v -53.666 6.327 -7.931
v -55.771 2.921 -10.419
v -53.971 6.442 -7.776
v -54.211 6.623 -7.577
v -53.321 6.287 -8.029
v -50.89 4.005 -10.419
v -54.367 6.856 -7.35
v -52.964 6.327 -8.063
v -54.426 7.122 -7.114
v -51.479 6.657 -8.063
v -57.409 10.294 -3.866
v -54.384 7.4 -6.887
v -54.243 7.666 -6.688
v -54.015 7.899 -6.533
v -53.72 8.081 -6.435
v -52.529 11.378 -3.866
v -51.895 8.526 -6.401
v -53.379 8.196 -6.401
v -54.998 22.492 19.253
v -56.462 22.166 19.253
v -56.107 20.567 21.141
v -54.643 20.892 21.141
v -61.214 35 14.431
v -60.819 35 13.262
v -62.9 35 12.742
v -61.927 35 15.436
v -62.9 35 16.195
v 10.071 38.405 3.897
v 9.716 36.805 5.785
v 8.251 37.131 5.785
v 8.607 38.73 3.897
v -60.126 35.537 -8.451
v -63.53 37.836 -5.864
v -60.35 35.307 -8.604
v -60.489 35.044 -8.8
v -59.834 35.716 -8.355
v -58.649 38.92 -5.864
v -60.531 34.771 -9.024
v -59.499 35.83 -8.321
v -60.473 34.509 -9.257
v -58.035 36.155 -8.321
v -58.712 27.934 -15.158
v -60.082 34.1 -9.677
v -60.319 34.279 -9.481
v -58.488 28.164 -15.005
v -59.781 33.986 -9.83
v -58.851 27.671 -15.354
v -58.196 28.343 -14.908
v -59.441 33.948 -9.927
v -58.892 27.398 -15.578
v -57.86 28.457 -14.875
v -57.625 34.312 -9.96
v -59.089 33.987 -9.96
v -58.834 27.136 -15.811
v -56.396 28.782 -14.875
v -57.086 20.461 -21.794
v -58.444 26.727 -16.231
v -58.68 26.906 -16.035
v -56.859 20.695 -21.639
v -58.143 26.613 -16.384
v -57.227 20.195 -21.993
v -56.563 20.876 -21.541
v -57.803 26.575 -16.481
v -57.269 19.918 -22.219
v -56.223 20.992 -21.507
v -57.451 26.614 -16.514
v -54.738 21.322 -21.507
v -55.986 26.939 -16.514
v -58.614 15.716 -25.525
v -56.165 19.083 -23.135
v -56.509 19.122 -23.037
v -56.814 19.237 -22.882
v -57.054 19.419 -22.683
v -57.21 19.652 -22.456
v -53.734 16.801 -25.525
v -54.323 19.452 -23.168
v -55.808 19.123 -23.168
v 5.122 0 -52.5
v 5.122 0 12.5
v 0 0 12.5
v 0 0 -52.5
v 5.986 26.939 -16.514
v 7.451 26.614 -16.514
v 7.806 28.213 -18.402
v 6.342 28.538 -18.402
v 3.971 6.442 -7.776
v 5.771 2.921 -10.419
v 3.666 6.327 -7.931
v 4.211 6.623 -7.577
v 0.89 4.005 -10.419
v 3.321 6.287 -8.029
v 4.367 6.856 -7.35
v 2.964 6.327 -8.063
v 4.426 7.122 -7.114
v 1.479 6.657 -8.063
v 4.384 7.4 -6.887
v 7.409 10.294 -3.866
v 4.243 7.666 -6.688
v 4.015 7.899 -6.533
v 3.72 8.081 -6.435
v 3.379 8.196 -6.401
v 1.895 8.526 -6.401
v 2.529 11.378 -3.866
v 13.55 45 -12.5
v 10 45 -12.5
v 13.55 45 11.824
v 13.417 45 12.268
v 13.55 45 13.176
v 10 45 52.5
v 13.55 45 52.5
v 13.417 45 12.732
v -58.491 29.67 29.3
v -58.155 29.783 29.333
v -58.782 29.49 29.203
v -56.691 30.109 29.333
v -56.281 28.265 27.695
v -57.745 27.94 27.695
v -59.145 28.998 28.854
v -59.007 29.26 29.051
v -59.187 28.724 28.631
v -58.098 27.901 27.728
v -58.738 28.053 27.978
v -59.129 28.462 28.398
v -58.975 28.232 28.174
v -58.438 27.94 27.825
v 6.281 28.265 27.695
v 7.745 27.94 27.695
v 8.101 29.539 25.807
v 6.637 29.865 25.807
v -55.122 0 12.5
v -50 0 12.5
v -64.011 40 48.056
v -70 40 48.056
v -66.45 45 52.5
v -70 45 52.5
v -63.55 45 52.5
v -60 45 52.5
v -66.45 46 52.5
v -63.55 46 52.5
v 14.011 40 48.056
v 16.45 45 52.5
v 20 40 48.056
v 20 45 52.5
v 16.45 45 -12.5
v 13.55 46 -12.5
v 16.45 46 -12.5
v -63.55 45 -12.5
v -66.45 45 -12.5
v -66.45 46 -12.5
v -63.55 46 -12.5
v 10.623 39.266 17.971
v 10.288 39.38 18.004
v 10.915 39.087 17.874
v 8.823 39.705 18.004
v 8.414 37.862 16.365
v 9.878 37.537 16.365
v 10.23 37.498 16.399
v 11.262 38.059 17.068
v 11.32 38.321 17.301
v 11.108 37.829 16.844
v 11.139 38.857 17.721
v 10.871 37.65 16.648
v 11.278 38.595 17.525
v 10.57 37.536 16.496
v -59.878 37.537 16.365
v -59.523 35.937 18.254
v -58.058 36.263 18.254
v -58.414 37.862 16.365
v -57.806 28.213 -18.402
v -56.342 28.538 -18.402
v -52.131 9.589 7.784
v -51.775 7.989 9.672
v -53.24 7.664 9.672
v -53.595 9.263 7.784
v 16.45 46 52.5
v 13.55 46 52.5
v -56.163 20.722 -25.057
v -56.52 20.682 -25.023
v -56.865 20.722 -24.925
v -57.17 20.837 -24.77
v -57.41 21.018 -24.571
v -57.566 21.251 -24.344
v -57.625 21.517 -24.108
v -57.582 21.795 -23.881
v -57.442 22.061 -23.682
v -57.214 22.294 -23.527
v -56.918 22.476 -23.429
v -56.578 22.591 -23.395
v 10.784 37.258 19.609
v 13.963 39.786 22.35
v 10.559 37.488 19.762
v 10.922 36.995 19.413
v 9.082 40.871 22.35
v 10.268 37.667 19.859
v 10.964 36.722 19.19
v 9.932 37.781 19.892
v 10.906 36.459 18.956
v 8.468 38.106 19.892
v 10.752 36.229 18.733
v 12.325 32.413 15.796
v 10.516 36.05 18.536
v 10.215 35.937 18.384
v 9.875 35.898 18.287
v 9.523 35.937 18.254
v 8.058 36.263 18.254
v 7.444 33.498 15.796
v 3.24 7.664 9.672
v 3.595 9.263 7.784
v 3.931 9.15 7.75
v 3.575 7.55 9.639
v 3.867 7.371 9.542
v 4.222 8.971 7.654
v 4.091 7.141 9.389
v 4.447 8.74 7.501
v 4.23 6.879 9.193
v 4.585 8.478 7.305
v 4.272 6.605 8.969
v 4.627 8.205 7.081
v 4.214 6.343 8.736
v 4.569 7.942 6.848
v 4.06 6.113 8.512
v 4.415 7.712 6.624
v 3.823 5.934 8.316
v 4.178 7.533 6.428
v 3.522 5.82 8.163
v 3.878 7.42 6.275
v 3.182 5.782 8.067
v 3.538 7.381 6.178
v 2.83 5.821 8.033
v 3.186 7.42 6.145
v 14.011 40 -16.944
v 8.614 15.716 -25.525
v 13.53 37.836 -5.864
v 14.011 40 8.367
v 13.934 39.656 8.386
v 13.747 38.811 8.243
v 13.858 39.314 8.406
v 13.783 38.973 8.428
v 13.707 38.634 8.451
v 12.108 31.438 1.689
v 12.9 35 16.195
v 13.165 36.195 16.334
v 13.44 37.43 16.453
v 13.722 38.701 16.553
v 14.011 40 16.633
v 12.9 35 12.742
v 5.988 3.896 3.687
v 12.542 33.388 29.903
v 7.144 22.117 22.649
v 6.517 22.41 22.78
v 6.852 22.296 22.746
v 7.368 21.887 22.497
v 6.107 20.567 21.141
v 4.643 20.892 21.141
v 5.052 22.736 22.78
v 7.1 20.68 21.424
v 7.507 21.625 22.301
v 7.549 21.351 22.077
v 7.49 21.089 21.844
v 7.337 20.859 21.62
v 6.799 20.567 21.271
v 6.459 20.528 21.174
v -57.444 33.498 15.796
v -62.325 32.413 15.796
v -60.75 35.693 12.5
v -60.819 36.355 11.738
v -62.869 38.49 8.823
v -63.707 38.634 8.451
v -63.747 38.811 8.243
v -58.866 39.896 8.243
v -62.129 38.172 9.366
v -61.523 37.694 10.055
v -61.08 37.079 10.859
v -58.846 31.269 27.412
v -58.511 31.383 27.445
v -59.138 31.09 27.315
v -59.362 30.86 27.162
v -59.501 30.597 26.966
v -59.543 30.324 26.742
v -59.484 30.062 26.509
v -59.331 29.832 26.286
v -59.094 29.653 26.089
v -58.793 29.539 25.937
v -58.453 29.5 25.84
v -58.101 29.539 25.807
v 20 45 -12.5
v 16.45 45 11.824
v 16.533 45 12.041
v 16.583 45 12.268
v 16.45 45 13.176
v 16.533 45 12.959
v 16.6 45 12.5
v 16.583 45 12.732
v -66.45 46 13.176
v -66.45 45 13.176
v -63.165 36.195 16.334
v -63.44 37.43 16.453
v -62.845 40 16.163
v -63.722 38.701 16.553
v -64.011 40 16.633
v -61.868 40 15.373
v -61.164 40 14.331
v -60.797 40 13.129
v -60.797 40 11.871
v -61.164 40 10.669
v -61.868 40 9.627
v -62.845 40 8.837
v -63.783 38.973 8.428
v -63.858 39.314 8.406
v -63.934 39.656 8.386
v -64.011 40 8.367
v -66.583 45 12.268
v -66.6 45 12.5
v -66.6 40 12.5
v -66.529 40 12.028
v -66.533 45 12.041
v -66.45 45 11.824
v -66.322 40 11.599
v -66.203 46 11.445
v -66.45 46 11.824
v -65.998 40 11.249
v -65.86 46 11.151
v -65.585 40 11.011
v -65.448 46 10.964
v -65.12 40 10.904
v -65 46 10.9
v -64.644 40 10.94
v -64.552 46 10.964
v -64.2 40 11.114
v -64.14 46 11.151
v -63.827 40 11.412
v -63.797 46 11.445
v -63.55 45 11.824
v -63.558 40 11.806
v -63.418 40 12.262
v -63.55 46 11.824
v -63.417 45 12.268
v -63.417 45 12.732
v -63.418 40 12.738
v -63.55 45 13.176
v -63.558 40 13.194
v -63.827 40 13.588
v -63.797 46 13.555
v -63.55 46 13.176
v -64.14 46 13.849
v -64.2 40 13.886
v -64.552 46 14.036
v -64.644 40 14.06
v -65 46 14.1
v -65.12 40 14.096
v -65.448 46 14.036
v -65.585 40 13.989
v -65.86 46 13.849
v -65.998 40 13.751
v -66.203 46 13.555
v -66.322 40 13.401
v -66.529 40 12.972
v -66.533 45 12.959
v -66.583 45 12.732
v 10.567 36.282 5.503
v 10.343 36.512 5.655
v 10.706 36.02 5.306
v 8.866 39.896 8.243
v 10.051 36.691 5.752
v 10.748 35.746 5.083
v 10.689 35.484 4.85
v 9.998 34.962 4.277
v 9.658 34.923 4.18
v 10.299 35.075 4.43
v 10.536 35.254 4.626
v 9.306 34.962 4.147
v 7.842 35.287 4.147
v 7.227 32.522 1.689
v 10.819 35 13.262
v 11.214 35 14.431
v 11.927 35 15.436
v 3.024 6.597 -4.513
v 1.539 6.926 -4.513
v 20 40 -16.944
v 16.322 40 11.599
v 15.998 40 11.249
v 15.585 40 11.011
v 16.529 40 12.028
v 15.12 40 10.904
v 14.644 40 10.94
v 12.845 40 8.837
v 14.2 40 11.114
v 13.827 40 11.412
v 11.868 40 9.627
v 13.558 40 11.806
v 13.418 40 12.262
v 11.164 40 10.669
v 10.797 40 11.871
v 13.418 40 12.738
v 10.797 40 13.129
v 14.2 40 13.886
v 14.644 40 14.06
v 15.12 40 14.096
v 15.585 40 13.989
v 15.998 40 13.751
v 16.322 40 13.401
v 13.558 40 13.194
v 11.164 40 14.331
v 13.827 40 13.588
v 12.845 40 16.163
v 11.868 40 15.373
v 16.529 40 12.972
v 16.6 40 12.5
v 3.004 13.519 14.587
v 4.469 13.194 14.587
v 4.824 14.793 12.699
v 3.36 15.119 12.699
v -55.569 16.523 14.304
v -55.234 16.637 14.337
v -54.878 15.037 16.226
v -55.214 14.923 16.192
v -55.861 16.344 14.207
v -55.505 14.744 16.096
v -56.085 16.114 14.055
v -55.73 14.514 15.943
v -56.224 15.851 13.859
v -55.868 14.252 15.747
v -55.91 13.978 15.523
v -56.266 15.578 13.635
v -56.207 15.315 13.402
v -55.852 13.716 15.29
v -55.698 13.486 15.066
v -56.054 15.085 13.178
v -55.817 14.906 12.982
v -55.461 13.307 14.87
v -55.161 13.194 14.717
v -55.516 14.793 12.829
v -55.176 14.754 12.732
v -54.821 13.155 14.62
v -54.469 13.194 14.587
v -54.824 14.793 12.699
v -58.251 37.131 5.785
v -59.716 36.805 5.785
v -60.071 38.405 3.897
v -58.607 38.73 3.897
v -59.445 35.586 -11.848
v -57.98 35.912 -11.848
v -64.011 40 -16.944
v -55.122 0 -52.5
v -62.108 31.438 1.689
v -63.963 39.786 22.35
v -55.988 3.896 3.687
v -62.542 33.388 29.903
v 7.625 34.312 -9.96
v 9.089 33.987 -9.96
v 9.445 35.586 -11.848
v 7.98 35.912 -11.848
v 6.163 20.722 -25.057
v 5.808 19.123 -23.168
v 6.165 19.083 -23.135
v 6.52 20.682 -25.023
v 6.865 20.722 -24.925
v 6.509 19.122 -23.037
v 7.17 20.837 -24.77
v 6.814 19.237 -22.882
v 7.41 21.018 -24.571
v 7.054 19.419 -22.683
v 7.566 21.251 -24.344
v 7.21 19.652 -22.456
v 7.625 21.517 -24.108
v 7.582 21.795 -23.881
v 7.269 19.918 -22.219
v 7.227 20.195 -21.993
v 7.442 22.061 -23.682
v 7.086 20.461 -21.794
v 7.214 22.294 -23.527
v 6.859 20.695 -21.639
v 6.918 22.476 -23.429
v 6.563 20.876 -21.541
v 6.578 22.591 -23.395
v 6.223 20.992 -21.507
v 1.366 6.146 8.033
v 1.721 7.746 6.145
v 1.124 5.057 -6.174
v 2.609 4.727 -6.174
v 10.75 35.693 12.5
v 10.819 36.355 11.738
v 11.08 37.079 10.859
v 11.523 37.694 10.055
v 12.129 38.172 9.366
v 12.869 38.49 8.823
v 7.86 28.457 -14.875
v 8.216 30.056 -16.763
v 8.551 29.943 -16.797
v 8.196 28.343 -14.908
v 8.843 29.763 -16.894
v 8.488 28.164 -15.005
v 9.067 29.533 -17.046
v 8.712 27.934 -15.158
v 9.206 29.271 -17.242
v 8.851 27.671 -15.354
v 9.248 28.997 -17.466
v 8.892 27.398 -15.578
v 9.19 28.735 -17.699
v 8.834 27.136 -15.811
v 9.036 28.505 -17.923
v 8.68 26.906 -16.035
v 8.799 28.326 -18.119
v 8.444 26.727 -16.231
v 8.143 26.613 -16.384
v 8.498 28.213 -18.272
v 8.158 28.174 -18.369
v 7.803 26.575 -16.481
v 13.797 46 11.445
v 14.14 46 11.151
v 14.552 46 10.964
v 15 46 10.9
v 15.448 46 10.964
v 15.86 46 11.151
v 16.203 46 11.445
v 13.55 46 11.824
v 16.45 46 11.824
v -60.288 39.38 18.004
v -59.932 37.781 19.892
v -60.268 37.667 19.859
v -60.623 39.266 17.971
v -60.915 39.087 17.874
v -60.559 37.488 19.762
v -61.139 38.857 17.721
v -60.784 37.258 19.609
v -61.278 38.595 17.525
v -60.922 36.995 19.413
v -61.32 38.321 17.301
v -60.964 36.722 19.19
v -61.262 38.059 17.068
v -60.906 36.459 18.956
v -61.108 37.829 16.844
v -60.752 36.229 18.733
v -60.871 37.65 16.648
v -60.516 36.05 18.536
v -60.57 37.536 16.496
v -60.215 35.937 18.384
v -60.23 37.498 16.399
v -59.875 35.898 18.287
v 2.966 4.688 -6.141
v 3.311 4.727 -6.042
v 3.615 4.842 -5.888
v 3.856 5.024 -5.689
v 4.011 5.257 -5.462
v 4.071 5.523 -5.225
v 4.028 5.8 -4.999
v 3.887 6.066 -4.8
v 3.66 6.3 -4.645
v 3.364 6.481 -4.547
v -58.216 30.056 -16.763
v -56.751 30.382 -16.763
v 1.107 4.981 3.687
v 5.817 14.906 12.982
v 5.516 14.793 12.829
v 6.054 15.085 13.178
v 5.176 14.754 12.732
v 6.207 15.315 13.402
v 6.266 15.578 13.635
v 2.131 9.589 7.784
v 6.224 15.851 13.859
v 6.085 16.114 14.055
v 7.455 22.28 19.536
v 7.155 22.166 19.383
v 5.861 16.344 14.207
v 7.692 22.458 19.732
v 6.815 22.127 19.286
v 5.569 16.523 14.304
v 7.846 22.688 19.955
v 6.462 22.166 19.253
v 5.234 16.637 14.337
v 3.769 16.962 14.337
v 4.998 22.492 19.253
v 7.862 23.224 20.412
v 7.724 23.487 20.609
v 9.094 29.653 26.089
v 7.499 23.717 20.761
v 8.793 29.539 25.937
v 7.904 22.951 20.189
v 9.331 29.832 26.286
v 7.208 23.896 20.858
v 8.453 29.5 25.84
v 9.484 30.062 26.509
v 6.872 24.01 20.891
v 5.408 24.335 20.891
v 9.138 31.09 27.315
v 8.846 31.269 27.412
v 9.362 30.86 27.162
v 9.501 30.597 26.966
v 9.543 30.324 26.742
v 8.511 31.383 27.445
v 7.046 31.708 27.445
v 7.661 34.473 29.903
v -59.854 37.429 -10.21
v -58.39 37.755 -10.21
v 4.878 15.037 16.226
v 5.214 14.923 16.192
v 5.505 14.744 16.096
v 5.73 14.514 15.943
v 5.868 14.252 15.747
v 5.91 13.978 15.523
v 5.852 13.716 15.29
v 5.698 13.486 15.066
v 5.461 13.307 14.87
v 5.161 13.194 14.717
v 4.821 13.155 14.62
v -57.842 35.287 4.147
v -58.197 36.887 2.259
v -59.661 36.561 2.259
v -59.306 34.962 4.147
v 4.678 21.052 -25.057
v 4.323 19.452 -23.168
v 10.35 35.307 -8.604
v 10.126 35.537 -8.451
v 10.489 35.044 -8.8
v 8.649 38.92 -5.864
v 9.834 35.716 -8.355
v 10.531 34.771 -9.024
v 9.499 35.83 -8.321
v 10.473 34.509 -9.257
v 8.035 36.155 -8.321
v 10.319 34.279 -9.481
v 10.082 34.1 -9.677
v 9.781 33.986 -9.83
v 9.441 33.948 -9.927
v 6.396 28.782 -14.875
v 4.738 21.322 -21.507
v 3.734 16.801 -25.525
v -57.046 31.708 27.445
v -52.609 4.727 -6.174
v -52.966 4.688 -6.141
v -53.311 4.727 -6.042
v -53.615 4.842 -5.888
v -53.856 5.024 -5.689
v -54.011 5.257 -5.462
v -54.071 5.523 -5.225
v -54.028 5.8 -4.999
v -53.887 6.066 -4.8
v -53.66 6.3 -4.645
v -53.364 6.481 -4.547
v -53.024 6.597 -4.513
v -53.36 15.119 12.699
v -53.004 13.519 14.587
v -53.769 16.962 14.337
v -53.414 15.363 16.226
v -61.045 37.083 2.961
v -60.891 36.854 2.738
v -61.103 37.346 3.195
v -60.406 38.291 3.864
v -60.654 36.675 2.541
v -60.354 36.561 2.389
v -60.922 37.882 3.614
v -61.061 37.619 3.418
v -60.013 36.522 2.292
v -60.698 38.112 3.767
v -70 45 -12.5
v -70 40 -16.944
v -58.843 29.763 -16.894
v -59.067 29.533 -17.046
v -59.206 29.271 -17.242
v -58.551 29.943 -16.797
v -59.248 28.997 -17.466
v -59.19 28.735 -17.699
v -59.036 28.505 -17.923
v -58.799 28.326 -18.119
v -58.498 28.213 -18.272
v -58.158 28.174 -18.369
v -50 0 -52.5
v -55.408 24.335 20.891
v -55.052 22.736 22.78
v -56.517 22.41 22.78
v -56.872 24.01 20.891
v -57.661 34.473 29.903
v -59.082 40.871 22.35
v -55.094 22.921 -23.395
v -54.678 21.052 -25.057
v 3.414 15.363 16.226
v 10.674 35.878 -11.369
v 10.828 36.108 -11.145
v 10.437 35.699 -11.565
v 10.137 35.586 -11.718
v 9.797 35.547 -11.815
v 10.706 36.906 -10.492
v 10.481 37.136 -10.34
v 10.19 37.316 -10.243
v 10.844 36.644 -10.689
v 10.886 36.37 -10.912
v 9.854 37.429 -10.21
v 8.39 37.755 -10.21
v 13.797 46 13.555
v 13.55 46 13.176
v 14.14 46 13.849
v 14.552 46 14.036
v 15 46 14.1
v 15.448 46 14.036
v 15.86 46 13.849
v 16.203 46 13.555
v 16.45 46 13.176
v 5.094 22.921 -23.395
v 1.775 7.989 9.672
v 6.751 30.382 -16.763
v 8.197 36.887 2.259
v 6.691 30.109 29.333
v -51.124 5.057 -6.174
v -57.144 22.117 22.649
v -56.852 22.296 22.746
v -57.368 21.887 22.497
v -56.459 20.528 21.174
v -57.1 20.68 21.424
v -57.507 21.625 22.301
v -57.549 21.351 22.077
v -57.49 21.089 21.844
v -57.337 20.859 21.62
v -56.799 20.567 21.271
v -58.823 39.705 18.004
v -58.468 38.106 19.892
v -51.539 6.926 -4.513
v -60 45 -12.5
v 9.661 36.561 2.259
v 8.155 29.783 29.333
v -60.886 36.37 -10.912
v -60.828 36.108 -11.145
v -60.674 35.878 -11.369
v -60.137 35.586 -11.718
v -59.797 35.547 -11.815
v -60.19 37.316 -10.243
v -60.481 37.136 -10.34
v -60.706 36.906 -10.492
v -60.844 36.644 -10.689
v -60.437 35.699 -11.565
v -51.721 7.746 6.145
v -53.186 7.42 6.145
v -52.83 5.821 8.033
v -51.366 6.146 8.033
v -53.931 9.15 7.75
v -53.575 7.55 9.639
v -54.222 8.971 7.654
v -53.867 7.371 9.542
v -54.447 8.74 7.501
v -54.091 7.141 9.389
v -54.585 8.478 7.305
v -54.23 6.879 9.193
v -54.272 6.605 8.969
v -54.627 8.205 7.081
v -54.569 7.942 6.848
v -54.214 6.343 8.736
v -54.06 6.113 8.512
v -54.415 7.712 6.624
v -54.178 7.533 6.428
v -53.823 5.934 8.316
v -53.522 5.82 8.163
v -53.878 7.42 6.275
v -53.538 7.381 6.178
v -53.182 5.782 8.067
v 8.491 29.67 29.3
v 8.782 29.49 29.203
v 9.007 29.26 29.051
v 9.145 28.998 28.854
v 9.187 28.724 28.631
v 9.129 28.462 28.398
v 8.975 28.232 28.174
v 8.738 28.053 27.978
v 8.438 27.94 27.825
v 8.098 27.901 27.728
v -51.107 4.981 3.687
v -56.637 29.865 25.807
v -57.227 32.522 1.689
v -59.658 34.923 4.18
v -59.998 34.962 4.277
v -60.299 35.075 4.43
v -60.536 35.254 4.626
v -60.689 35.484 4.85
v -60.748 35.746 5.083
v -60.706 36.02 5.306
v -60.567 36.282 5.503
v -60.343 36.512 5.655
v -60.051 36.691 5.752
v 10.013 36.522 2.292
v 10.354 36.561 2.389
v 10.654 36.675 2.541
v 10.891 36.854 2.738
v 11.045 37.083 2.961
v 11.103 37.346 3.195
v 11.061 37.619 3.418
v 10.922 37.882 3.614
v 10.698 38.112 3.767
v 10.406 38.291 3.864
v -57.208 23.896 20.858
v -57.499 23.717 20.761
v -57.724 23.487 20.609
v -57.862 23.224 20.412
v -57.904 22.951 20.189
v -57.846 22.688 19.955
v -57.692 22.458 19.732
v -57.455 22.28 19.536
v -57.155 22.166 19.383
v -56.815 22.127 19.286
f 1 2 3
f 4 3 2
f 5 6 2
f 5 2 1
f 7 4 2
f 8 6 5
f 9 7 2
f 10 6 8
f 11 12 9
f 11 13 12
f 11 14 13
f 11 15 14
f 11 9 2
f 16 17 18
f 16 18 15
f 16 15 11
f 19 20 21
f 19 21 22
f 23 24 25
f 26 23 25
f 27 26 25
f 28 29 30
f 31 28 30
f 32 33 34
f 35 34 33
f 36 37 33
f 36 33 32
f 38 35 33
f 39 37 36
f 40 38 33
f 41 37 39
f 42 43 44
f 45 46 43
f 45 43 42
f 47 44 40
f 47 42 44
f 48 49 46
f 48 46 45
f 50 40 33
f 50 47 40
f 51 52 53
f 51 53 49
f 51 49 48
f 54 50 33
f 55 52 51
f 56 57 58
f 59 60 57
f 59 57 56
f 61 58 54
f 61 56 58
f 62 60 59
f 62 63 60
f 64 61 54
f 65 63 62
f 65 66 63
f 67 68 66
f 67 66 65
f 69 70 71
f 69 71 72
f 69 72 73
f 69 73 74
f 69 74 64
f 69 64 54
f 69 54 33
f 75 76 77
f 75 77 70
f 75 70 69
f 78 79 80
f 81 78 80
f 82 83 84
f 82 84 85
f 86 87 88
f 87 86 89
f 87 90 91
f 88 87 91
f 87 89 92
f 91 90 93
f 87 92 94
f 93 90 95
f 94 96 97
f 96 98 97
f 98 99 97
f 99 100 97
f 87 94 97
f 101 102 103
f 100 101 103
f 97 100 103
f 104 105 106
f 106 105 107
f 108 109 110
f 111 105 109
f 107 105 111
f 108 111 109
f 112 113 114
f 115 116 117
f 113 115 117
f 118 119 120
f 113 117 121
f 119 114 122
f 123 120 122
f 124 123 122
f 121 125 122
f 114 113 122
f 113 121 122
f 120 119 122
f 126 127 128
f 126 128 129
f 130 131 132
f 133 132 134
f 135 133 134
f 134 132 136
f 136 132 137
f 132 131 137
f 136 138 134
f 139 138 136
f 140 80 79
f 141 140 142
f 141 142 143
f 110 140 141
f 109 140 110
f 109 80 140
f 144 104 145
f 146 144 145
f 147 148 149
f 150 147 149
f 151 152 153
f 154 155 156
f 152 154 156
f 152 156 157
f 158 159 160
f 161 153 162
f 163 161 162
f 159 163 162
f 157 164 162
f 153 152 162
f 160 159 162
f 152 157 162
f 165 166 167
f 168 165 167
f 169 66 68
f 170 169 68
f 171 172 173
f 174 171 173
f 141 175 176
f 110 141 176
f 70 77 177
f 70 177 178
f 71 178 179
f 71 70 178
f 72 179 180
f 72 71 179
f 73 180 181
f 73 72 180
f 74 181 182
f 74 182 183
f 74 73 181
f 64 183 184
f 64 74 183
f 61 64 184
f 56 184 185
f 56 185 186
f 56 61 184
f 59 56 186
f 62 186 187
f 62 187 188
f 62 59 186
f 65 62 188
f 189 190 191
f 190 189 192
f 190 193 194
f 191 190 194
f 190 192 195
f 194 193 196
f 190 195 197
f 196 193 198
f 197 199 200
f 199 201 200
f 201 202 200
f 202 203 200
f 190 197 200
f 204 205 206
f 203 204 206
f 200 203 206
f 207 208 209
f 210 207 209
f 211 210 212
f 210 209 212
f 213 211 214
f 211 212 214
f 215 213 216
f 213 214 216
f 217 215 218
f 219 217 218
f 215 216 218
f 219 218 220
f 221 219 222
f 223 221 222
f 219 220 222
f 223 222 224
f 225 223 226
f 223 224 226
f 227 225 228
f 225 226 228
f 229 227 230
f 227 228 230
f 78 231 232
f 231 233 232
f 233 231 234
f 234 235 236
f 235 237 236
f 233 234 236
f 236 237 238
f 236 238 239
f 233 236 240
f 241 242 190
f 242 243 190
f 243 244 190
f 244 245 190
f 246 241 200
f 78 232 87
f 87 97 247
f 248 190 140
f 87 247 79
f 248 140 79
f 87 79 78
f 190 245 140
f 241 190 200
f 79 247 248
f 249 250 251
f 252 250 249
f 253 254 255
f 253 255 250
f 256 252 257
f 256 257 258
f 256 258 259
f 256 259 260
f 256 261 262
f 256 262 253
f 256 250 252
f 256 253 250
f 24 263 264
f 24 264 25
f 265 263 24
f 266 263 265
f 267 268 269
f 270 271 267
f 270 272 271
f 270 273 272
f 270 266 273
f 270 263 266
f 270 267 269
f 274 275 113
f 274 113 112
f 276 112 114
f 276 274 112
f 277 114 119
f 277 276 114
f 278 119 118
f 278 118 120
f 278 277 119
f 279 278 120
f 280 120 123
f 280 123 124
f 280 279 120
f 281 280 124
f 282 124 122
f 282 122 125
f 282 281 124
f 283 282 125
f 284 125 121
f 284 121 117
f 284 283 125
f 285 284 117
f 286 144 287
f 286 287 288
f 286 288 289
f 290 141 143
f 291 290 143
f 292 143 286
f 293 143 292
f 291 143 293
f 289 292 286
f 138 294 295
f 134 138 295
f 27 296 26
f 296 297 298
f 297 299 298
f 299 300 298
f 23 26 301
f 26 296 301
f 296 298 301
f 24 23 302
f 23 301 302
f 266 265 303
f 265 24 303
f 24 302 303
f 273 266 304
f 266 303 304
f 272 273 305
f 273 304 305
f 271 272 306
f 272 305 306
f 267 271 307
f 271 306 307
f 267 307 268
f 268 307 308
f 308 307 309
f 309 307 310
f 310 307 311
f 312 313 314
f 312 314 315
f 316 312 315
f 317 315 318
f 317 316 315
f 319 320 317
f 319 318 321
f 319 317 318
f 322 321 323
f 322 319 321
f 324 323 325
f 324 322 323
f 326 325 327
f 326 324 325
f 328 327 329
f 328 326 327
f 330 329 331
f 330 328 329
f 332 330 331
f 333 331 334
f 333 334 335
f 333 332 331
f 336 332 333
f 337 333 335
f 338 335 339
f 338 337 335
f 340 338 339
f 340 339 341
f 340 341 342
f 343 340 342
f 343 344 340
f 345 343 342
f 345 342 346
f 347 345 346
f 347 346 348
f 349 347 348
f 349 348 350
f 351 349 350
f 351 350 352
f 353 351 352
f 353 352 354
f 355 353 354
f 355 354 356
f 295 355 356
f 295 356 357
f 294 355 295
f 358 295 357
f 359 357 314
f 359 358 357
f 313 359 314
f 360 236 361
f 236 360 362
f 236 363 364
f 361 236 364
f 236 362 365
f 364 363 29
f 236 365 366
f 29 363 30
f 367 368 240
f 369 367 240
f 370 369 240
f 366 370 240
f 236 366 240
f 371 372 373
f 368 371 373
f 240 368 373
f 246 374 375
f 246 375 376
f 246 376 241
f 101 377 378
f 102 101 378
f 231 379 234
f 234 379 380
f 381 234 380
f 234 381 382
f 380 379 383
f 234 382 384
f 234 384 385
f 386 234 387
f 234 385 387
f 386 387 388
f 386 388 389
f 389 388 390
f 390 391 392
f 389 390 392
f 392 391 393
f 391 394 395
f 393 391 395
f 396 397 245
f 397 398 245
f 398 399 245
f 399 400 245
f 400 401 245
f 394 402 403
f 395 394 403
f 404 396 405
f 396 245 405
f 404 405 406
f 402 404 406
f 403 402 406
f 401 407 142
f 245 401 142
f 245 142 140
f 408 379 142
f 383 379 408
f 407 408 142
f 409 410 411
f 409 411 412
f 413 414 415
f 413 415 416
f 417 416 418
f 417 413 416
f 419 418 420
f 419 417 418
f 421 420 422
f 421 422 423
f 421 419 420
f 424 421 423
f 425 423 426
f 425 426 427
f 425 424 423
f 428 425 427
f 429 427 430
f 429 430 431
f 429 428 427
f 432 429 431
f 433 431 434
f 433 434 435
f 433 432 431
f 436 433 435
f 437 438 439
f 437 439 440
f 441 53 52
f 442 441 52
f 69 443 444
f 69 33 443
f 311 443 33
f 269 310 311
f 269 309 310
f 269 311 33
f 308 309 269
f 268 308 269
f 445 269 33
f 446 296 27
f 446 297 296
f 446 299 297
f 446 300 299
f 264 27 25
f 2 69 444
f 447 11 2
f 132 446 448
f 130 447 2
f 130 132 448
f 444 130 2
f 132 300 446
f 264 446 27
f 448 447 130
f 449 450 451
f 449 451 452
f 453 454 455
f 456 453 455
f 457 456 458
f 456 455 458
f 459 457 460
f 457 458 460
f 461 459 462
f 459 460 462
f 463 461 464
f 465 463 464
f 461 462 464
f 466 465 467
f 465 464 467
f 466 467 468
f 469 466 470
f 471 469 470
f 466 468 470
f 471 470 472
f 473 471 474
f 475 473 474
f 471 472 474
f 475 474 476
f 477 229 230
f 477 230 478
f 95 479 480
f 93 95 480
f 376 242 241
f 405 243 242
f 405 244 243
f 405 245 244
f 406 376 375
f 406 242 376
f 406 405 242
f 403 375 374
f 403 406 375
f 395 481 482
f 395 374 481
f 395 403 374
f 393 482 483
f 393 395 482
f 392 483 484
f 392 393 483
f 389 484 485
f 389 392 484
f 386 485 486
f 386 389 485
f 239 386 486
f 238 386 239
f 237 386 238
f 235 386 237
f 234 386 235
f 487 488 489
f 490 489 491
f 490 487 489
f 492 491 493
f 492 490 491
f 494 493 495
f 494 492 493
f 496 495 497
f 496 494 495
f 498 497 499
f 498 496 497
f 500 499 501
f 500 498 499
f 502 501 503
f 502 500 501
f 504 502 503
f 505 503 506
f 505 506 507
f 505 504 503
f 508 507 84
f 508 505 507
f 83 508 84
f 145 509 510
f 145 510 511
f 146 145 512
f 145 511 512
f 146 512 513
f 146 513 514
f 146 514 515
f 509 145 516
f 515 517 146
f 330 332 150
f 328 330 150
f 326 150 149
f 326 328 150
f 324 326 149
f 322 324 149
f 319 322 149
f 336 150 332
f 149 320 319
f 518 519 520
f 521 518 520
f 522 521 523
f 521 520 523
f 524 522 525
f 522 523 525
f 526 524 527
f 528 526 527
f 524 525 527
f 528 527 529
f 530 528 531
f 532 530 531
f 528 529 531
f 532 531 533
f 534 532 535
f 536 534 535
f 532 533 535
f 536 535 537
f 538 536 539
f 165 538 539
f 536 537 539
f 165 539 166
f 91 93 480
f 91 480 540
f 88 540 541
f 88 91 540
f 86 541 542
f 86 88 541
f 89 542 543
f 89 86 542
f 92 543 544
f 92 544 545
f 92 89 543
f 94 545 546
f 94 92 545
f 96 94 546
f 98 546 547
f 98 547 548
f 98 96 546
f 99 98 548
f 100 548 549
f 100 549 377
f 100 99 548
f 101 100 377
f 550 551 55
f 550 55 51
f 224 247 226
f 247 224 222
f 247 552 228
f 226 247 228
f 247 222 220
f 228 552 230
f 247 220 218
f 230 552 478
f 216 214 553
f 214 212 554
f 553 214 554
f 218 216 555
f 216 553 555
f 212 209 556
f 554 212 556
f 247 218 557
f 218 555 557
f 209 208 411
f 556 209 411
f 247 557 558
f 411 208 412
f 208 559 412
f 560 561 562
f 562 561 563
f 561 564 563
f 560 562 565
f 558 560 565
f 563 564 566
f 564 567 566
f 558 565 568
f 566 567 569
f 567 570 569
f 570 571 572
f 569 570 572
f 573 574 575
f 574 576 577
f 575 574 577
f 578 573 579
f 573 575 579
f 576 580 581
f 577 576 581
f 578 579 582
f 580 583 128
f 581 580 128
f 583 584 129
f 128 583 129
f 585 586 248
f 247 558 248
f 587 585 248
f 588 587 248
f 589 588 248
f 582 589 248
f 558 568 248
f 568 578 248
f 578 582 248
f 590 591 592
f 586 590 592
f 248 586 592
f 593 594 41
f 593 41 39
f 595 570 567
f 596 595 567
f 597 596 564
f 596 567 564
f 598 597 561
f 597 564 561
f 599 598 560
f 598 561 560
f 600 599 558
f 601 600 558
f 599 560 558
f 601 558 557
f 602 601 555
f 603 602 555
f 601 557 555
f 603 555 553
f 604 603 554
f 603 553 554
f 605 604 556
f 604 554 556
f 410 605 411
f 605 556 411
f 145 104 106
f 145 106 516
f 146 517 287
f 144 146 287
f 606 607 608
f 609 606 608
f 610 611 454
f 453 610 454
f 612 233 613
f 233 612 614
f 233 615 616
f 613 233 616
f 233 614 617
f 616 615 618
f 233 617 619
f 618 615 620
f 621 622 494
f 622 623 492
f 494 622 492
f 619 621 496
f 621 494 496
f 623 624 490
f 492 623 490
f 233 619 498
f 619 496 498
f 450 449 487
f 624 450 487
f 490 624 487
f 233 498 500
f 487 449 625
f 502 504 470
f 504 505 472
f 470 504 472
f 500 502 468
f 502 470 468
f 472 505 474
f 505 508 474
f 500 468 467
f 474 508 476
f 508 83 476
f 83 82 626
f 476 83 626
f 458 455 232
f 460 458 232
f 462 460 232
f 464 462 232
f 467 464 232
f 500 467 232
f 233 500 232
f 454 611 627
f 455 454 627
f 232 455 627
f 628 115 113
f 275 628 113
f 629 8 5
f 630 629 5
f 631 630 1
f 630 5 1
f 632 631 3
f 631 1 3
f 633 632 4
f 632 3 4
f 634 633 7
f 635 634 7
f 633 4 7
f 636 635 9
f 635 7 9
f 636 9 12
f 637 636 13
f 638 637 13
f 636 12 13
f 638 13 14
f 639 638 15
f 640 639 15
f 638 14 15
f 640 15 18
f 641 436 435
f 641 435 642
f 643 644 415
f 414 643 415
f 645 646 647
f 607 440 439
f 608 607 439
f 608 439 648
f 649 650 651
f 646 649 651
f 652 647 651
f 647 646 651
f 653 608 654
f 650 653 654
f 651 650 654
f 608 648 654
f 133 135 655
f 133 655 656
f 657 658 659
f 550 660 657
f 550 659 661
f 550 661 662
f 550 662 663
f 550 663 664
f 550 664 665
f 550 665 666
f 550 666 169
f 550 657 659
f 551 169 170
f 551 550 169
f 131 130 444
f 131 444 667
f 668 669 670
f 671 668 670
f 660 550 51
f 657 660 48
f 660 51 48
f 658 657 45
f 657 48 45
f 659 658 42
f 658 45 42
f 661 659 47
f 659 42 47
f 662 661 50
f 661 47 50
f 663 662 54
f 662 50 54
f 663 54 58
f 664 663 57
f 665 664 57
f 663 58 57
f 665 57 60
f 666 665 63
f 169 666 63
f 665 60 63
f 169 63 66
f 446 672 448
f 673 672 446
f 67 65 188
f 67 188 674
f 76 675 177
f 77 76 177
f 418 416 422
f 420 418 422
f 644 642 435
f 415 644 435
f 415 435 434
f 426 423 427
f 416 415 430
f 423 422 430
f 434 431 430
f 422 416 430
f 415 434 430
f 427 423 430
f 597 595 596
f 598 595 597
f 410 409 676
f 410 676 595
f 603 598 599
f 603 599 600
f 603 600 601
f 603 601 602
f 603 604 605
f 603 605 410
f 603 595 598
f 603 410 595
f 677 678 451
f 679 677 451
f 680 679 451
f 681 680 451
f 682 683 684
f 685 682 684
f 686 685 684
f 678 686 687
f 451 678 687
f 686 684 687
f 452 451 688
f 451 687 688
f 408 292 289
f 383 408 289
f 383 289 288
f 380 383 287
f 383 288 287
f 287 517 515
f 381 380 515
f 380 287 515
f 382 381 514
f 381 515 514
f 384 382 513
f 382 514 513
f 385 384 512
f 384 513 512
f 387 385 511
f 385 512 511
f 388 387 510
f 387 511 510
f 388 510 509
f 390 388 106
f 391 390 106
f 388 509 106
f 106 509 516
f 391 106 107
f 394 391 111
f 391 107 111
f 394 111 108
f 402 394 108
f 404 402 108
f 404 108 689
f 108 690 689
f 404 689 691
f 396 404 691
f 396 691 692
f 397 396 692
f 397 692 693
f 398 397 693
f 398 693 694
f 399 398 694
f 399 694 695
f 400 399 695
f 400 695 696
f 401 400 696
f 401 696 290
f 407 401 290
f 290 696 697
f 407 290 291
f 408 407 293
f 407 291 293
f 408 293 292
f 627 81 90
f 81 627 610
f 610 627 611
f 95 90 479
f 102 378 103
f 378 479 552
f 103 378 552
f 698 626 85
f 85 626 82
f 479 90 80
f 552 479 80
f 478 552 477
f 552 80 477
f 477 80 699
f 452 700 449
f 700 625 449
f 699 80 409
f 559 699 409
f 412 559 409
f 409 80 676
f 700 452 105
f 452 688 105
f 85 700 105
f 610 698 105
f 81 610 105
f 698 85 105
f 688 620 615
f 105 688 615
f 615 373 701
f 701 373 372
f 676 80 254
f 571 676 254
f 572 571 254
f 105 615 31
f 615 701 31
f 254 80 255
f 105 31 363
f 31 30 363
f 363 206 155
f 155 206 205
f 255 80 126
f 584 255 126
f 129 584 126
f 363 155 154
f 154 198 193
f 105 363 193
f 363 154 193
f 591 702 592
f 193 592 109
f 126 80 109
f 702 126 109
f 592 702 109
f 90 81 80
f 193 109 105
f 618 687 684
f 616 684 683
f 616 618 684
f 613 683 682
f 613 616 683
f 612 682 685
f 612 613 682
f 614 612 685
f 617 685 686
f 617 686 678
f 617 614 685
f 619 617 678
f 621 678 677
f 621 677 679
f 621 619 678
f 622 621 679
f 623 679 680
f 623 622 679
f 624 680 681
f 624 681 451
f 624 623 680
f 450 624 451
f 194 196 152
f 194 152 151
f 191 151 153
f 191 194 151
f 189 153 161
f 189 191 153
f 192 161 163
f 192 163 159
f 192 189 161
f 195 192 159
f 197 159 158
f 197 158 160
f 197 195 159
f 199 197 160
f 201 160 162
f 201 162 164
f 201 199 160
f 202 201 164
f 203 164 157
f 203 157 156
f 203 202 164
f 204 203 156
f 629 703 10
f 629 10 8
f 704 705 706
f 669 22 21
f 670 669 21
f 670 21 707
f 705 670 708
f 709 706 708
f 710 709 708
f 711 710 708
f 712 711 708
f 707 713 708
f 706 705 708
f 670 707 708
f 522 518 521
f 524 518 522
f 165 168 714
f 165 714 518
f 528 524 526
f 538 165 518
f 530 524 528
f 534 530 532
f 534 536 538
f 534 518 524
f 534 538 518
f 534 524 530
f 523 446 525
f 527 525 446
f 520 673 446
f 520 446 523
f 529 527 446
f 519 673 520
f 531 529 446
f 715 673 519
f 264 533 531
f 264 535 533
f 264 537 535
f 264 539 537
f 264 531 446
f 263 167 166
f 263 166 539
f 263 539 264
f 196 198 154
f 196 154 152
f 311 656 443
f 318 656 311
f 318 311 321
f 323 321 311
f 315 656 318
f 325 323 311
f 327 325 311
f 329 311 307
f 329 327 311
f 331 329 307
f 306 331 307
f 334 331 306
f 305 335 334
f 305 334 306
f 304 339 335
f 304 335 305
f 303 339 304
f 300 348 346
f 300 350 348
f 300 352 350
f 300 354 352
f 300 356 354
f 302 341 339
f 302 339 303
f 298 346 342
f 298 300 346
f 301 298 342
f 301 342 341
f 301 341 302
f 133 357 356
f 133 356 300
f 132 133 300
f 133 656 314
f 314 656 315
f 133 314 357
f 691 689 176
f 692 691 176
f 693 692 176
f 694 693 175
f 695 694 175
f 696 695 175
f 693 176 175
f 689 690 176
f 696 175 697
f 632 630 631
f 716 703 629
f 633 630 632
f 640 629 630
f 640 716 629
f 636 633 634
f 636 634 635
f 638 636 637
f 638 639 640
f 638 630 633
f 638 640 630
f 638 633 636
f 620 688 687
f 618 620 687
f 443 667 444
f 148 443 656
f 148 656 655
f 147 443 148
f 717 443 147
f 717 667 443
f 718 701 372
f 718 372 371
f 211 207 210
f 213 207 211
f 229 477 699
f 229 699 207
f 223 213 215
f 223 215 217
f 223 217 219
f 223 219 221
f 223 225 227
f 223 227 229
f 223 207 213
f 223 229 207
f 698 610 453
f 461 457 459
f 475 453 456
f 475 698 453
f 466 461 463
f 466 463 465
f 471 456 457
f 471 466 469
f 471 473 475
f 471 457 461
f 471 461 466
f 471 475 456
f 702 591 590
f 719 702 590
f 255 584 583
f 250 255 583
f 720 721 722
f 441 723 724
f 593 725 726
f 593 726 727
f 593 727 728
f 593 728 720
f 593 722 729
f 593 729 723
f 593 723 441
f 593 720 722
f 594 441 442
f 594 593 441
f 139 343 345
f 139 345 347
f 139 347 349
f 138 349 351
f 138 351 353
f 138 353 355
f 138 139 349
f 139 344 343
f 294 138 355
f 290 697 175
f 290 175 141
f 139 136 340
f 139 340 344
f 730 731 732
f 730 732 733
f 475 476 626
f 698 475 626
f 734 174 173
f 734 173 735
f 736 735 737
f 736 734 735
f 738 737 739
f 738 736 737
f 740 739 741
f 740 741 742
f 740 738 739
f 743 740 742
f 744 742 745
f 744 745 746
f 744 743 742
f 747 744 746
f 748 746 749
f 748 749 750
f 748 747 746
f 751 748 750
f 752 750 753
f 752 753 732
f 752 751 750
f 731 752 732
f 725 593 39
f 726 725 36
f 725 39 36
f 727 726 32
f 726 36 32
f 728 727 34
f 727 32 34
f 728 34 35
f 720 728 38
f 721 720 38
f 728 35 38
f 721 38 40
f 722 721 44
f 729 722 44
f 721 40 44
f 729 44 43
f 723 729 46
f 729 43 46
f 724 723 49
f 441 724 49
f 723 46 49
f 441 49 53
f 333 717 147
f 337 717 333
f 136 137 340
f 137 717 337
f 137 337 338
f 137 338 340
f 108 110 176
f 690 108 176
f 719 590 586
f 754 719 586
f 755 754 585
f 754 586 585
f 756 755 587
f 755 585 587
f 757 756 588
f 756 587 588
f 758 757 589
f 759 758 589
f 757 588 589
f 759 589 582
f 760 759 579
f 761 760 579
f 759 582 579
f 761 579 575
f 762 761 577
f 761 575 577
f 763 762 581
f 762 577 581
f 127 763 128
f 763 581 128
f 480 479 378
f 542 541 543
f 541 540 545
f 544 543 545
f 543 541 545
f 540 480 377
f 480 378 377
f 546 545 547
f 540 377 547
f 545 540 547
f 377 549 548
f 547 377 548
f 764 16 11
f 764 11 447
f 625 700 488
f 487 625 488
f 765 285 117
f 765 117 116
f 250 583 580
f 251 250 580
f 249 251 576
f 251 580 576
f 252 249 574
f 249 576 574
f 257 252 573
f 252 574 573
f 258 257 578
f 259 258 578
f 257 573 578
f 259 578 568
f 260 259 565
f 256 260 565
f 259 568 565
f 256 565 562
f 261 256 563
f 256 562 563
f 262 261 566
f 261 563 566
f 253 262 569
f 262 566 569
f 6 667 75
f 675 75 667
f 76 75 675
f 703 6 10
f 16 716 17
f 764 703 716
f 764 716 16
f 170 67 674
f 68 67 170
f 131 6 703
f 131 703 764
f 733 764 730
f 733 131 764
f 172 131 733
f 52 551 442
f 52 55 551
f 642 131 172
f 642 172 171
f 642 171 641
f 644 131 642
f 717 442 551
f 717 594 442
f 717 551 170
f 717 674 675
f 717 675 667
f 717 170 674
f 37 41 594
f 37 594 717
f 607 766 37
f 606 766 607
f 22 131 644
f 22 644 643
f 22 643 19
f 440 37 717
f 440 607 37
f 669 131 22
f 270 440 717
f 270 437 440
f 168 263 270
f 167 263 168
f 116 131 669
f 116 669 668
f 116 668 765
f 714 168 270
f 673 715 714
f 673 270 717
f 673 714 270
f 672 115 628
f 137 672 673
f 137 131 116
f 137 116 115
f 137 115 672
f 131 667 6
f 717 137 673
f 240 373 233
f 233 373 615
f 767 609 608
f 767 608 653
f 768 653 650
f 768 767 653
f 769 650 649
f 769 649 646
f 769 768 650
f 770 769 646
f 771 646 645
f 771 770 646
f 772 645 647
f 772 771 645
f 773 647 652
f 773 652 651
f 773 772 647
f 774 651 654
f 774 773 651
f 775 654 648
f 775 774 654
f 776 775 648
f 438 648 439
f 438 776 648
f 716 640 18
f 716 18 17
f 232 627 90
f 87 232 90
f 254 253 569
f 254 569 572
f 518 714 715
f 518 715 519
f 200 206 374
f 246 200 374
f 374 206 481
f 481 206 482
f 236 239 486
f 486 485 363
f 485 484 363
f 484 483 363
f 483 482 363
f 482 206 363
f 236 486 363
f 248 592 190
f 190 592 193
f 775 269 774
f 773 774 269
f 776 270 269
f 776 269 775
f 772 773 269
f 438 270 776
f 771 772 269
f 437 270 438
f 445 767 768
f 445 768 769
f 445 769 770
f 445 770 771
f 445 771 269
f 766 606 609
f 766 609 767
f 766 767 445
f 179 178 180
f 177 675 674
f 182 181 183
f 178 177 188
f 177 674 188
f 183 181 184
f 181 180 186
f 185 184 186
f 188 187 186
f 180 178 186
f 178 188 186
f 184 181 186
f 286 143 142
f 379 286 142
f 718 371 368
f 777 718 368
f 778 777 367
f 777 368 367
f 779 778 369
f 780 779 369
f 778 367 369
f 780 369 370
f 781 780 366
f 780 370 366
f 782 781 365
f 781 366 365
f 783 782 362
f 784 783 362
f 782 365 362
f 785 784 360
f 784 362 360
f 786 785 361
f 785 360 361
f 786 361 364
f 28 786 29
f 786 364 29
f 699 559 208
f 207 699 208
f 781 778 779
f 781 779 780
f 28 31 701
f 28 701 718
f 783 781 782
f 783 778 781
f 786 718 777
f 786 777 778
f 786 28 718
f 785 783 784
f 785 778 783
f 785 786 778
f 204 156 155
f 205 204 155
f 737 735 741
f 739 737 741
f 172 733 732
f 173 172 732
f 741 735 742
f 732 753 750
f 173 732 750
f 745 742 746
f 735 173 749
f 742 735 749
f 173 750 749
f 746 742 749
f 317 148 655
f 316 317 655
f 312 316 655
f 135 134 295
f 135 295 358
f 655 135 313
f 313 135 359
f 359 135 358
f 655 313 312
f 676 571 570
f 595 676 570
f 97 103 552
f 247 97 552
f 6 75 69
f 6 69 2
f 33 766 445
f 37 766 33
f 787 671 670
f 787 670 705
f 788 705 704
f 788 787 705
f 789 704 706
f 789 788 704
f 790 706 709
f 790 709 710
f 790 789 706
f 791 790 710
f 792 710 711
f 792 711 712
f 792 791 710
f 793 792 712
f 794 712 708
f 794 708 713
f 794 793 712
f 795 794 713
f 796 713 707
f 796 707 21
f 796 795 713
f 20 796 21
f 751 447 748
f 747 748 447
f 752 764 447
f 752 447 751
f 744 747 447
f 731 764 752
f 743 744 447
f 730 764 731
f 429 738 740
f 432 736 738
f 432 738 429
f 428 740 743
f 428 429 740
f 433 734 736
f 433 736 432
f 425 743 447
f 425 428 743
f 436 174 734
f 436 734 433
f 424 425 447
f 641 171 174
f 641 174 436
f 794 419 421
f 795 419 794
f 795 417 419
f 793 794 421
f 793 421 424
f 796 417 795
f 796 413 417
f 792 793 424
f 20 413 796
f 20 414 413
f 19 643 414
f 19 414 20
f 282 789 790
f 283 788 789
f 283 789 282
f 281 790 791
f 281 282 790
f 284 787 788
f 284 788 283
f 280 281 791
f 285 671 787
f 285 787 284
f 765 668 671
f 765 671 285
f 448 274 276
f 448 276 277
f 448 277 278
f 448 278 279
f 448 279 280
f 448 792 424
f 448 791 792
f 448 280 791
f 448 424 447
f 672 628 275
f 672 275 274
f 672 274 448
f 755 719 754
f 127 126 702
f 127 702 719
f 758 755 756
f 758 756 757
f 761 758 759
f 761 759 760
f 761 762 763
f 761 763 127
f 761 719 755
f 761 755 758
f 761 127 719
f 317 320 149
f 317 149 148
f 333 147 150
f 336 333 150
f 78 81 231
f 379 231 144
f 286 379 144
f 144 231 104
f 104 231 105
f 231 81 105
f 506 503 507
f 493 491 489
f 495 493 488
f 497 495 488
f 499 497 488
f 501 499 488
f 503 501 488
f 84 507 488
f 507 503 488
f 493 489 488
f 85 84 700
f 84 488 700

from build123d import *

# Parameters (mm, degrees)
MAIN_DEPTH               = 52.5
SKETCH3_R                = 1.6
MAKERBEAMFIXHOLES_DEPTH  = 47
SIDECUT_DEPTH            = 21
SIDECUT_DEPTH_BACK       = 1
CENTRALCUT_DEPTH         = 10
ROLLERSUPPORTHOLES_DEPTH = 2.5
LPATTERN1_COUNT          = 4
LPATTERN1_PITCH          = 10
CUT_EXTRUDE1_DEPTH       = 25
CUT_EXTRUDE2_DEPTH       = 35
CUT_EXTRUDE3_DEPTH       = 35
CUT_EXTRUDE4_DEPTH       = 2.5
SKETCH10_R               = 4.25
CUT_EXTRUDE5_DEPTH       = 5


with BuildPart() as part:
    # Sketch1 → Main (new body, symmetric)
    with BuildSketch(Plane.XY):
        Polygon((20, 45), (20, 40), (14.010858032, 40), (5.121969143, 0), (0, 0), (10, 45), (13.55, 45), (13.55, 46), (16.45, 46), (16.45, 45), align=None)
    extrude(amount=MAIN_DEPTH, both=True)

    # Sketch3 → MakerBeamFixHoles (cut, through all)
    with BuildSketch(Plane(origin=(0, 46, 0), x_dir=(1, 0, 0), z_dir=(0, 1, 0))):
        with Locations((15, -12.5)):
            Circle(SKETCH3_R)
    extrude(amount=-MAKERBEAMFIXHOLES_DEPTH, mode=Mode.SUBTRACT)

    # Sketch2 → SideCut (cut, two sides)
    with BuildSketch(Plane(origin=(0, 40.615528128, 0), x_dir=(0, 0, 1), z_dir=(1, 0, 0))) as sidecut_sk:
        Polygon((-52.5, 40.615528128), (-12.5, -4.384471872), (-12.5, -5.384471872), (-52.5, -5.384471872), align=None)
        Polygon((52.5, -4.384471872), (52.5, 40.615528128), (12.5, 40.615528128), align=None)
    extrude(amount=SIDECUT_DEPTH, mode=Mode.SUBTRACT)
    extrude(sidecut_sk.sketch, amount=-SIDECUT_DEPTH_BACK, mode=Mode.SUBTRACT)

    # Sketch5 → CentralCut (cut)
    with BuildSketch(Plane(origin=(0, 0, 0), x_dir=(0, 0, 1), z_dir=(-0.97618706, 0.216930458, 0))):
        Polygon((22.349889157, 41.867825412), (15.796033792, 34.3148803), (8.24308868, 40.868735664), (1.689233316, 33.315790552), (-5.863711796, 39.869645916), (-25.525277888, 17.21081058), (-10.419387664, 4.103099851), (-3.8655323, 11.656044963), (3.687412812, 5.102189599), (29.902834269, 35.313970048), align=None)
    extrude(amount=-CENTRALCUT_DEPTH, mode=Mode.SUBTRACT)

    # Sketch4 → RollerSupportHoles (cut)
    with BuildSketch(Plane(origin=(0.079448965, 7.857631633, 5.930962816), x_dir=(-0.989841813, 0.091892801, -0.108484557), z_dir=(-0.142173084, -0.63977888, 0.755294511))):
        with BuildLine():
            Line((-6.624479528, -29.639079578), (-7.038299145, -32.104592369))
            Line((-7.038299145, -32.104592369), (-8.51760682, -31.856300599))
            ThreePointArc((-8.51760682, -31.856300599), (-9.543453407, -30.416634395), (-8.103787203, -29.390787808))
            Line((-8.103787203, -29.390787808), (-6.624479528, -29.639079578))
        make_face()
    rollersupportholes = extrude(amount=ROLLERSUPPORTHOLES_DEPTH, mode=Mode.SUBTRACT)

    # LPattern1: RollerSupportHoles ×4
    with Locations(*[Vector(-0.163846384, -0.737308728, -0.655385536) * (i * LPATTERN1_PITCH) for i in range(1, LPATTERN1_COUNT)]):
        add(rollersupportholes, mode=Mode.SUBTRACT)

    # Sketch6 → Cut-Extrude1 (cut)
    with BuildSketch(Plane(origin=(-0.275983746, -1.241926856, 1.466163649), x_dir=(-0.989841813, 0.091892801, -0.108484557), z_dir=(0.142173084, 0.63977888, -0.755294511))):
        with BuildLine():
            Line((-5.383020676, 32.071718622), (-4.969201058, 29.60620583))
            Line((-4.969201058, 29.60620583), (-6.448508733, 29.35791406))
            ThreePointArc((-6.448508733, 29.35791406), (-7.888174937, 30.383760647), (-6.86232835, 31.823426851))
            Line((-6.86232835, 31.823426851), (-5.383020676, 32.071718622))
        make_face()
    extrude(amount=CUT_EXTRUDE1_DEPTH, mode=Mode.SUBTRACT)

    # Mirror5: RollerSupportHoles across plane
    add(rollersupportholes.mirror(Plane(origin=(0.790314388, 3.556414745, -4.198545185), x_dir=(0.163846384, 0.737308728, 0.655385536), z_dir=(0.142173084, 0.63977888, -0.755294511))), mode=Mode.SUBTRACT)

    # Sketch7 → Cut-Extrude2 (cut)
    with BuildSketch(Plane(origin=(-0.275983746, -1.241926856, 1.466163649), x_dir=(-0.989841813, 0.091892801, -0.108484557), z_dir=(0.142173084, 0.63977888, -0.755294511))):
        with BuildLine():
            Line((-4.793230263, 19.495862895), (-3.313922588, 19.744154665))
            Line((-3.313922588, 19.744154665), (-3.727742206, 22.209667456))
            Line((-3.727742206, 22.209667456), (-5.20704988, 21.961375686))
            ThreePointArc((-5.20704988, 21.961375686), (-6.232896467, 20.521709481), (-4.793230263, 19.495862895))
        make_face()
    extrude(amount=CUT_EXTRUDE2_DEPTH, mode=Mode.SUBTRACT)

    # Sketch8 → Cut-Extrude3 (cut)
    with BuildSketch(Plane(origin=(-0.275983746, -1.241926856, 1.466163649), x_dir=(-0.989841813, 0.091892801, -0.108484557), z_dir=(0.142173084, 0.63977888, -0.755294511))):
        with BuildLine():
            Line((-3.137951793, 9.633811729), (-1.658644118, 9.8821035))
            Line((-1.658644118, 9.8821035), (-2.072463736, 12.347616291))
            Line((-2.072463736, 12.347616291), (-3.551771411, 12.099324521))
            ThreePointArc((-3.551771411, 12.099324521), (-4.577617998, 10.659658316), (-3.137951793, 9.633811729))
        make_face()
    extrude(amount=CUT_EXTRUDE3_DEPTH, mode=Mode.SUBTRACT)

    # Sketch9 → Cut-Extrude4 (cut)
    with BuildSketch(Plane(origin=(4.344641499, 19.550886747, -23.080907965), x_dir=(0.989841813, -0.091892801, 0.108484557), z_dir=(-0.142173084, -0.63977888, 0.755294511))):
        with BuildLine():
            Line((-0.02209942, -0.131667038), (1.47790058, -0.383431875))
            ThreePointArc((1.47790058, -0.383431875), (2.937704611, 0.656764094), (1.897508642, 2.116568125))
            Line((1.897508642, 2.116568125), (0.397508642, 2.368332962))
            Line((0.397508642, 2.368332962), (-0.02209942, -0.131667038))
        make_face()
    cut_extrude4 = extrude(amount=-CUT_EXTRUDE4_DEPTH, mode=Mode.SUBTRACT)

    # Sketch10 → Cut-Extrude5 (cut)
    with BuildSketch(Plane.XZ.offset(-40)):
        with Locations((15, 12.5)):
            Circle(SKETCH10_R)
    extrude(amount=CUT_EXTRUDE5_DEPTH, mode=Mode.SUBTRACT)

    # Mirror6: Cut-Extrude4 across plane
    add(cut_extrude4.mirror(Plane(origin=(18.62754414, 37.726226343, 8.24308868), x_dir=(0.163846384, 0.737308728, 0.655385536), z_dir=(0.142173084, 0.63977888, -0.755294511))), mode=Mode.SUBTRACT)


with BuildPart() as body_2:
    # Mirror4: mirrored copy
    add(part.part.mirror(Plane(origin=(-25, 0, 0), x_dir=(0, 0, 1), z_dir=(1, 0, 0))))


solid = Compound([part.part, body_2.part])
